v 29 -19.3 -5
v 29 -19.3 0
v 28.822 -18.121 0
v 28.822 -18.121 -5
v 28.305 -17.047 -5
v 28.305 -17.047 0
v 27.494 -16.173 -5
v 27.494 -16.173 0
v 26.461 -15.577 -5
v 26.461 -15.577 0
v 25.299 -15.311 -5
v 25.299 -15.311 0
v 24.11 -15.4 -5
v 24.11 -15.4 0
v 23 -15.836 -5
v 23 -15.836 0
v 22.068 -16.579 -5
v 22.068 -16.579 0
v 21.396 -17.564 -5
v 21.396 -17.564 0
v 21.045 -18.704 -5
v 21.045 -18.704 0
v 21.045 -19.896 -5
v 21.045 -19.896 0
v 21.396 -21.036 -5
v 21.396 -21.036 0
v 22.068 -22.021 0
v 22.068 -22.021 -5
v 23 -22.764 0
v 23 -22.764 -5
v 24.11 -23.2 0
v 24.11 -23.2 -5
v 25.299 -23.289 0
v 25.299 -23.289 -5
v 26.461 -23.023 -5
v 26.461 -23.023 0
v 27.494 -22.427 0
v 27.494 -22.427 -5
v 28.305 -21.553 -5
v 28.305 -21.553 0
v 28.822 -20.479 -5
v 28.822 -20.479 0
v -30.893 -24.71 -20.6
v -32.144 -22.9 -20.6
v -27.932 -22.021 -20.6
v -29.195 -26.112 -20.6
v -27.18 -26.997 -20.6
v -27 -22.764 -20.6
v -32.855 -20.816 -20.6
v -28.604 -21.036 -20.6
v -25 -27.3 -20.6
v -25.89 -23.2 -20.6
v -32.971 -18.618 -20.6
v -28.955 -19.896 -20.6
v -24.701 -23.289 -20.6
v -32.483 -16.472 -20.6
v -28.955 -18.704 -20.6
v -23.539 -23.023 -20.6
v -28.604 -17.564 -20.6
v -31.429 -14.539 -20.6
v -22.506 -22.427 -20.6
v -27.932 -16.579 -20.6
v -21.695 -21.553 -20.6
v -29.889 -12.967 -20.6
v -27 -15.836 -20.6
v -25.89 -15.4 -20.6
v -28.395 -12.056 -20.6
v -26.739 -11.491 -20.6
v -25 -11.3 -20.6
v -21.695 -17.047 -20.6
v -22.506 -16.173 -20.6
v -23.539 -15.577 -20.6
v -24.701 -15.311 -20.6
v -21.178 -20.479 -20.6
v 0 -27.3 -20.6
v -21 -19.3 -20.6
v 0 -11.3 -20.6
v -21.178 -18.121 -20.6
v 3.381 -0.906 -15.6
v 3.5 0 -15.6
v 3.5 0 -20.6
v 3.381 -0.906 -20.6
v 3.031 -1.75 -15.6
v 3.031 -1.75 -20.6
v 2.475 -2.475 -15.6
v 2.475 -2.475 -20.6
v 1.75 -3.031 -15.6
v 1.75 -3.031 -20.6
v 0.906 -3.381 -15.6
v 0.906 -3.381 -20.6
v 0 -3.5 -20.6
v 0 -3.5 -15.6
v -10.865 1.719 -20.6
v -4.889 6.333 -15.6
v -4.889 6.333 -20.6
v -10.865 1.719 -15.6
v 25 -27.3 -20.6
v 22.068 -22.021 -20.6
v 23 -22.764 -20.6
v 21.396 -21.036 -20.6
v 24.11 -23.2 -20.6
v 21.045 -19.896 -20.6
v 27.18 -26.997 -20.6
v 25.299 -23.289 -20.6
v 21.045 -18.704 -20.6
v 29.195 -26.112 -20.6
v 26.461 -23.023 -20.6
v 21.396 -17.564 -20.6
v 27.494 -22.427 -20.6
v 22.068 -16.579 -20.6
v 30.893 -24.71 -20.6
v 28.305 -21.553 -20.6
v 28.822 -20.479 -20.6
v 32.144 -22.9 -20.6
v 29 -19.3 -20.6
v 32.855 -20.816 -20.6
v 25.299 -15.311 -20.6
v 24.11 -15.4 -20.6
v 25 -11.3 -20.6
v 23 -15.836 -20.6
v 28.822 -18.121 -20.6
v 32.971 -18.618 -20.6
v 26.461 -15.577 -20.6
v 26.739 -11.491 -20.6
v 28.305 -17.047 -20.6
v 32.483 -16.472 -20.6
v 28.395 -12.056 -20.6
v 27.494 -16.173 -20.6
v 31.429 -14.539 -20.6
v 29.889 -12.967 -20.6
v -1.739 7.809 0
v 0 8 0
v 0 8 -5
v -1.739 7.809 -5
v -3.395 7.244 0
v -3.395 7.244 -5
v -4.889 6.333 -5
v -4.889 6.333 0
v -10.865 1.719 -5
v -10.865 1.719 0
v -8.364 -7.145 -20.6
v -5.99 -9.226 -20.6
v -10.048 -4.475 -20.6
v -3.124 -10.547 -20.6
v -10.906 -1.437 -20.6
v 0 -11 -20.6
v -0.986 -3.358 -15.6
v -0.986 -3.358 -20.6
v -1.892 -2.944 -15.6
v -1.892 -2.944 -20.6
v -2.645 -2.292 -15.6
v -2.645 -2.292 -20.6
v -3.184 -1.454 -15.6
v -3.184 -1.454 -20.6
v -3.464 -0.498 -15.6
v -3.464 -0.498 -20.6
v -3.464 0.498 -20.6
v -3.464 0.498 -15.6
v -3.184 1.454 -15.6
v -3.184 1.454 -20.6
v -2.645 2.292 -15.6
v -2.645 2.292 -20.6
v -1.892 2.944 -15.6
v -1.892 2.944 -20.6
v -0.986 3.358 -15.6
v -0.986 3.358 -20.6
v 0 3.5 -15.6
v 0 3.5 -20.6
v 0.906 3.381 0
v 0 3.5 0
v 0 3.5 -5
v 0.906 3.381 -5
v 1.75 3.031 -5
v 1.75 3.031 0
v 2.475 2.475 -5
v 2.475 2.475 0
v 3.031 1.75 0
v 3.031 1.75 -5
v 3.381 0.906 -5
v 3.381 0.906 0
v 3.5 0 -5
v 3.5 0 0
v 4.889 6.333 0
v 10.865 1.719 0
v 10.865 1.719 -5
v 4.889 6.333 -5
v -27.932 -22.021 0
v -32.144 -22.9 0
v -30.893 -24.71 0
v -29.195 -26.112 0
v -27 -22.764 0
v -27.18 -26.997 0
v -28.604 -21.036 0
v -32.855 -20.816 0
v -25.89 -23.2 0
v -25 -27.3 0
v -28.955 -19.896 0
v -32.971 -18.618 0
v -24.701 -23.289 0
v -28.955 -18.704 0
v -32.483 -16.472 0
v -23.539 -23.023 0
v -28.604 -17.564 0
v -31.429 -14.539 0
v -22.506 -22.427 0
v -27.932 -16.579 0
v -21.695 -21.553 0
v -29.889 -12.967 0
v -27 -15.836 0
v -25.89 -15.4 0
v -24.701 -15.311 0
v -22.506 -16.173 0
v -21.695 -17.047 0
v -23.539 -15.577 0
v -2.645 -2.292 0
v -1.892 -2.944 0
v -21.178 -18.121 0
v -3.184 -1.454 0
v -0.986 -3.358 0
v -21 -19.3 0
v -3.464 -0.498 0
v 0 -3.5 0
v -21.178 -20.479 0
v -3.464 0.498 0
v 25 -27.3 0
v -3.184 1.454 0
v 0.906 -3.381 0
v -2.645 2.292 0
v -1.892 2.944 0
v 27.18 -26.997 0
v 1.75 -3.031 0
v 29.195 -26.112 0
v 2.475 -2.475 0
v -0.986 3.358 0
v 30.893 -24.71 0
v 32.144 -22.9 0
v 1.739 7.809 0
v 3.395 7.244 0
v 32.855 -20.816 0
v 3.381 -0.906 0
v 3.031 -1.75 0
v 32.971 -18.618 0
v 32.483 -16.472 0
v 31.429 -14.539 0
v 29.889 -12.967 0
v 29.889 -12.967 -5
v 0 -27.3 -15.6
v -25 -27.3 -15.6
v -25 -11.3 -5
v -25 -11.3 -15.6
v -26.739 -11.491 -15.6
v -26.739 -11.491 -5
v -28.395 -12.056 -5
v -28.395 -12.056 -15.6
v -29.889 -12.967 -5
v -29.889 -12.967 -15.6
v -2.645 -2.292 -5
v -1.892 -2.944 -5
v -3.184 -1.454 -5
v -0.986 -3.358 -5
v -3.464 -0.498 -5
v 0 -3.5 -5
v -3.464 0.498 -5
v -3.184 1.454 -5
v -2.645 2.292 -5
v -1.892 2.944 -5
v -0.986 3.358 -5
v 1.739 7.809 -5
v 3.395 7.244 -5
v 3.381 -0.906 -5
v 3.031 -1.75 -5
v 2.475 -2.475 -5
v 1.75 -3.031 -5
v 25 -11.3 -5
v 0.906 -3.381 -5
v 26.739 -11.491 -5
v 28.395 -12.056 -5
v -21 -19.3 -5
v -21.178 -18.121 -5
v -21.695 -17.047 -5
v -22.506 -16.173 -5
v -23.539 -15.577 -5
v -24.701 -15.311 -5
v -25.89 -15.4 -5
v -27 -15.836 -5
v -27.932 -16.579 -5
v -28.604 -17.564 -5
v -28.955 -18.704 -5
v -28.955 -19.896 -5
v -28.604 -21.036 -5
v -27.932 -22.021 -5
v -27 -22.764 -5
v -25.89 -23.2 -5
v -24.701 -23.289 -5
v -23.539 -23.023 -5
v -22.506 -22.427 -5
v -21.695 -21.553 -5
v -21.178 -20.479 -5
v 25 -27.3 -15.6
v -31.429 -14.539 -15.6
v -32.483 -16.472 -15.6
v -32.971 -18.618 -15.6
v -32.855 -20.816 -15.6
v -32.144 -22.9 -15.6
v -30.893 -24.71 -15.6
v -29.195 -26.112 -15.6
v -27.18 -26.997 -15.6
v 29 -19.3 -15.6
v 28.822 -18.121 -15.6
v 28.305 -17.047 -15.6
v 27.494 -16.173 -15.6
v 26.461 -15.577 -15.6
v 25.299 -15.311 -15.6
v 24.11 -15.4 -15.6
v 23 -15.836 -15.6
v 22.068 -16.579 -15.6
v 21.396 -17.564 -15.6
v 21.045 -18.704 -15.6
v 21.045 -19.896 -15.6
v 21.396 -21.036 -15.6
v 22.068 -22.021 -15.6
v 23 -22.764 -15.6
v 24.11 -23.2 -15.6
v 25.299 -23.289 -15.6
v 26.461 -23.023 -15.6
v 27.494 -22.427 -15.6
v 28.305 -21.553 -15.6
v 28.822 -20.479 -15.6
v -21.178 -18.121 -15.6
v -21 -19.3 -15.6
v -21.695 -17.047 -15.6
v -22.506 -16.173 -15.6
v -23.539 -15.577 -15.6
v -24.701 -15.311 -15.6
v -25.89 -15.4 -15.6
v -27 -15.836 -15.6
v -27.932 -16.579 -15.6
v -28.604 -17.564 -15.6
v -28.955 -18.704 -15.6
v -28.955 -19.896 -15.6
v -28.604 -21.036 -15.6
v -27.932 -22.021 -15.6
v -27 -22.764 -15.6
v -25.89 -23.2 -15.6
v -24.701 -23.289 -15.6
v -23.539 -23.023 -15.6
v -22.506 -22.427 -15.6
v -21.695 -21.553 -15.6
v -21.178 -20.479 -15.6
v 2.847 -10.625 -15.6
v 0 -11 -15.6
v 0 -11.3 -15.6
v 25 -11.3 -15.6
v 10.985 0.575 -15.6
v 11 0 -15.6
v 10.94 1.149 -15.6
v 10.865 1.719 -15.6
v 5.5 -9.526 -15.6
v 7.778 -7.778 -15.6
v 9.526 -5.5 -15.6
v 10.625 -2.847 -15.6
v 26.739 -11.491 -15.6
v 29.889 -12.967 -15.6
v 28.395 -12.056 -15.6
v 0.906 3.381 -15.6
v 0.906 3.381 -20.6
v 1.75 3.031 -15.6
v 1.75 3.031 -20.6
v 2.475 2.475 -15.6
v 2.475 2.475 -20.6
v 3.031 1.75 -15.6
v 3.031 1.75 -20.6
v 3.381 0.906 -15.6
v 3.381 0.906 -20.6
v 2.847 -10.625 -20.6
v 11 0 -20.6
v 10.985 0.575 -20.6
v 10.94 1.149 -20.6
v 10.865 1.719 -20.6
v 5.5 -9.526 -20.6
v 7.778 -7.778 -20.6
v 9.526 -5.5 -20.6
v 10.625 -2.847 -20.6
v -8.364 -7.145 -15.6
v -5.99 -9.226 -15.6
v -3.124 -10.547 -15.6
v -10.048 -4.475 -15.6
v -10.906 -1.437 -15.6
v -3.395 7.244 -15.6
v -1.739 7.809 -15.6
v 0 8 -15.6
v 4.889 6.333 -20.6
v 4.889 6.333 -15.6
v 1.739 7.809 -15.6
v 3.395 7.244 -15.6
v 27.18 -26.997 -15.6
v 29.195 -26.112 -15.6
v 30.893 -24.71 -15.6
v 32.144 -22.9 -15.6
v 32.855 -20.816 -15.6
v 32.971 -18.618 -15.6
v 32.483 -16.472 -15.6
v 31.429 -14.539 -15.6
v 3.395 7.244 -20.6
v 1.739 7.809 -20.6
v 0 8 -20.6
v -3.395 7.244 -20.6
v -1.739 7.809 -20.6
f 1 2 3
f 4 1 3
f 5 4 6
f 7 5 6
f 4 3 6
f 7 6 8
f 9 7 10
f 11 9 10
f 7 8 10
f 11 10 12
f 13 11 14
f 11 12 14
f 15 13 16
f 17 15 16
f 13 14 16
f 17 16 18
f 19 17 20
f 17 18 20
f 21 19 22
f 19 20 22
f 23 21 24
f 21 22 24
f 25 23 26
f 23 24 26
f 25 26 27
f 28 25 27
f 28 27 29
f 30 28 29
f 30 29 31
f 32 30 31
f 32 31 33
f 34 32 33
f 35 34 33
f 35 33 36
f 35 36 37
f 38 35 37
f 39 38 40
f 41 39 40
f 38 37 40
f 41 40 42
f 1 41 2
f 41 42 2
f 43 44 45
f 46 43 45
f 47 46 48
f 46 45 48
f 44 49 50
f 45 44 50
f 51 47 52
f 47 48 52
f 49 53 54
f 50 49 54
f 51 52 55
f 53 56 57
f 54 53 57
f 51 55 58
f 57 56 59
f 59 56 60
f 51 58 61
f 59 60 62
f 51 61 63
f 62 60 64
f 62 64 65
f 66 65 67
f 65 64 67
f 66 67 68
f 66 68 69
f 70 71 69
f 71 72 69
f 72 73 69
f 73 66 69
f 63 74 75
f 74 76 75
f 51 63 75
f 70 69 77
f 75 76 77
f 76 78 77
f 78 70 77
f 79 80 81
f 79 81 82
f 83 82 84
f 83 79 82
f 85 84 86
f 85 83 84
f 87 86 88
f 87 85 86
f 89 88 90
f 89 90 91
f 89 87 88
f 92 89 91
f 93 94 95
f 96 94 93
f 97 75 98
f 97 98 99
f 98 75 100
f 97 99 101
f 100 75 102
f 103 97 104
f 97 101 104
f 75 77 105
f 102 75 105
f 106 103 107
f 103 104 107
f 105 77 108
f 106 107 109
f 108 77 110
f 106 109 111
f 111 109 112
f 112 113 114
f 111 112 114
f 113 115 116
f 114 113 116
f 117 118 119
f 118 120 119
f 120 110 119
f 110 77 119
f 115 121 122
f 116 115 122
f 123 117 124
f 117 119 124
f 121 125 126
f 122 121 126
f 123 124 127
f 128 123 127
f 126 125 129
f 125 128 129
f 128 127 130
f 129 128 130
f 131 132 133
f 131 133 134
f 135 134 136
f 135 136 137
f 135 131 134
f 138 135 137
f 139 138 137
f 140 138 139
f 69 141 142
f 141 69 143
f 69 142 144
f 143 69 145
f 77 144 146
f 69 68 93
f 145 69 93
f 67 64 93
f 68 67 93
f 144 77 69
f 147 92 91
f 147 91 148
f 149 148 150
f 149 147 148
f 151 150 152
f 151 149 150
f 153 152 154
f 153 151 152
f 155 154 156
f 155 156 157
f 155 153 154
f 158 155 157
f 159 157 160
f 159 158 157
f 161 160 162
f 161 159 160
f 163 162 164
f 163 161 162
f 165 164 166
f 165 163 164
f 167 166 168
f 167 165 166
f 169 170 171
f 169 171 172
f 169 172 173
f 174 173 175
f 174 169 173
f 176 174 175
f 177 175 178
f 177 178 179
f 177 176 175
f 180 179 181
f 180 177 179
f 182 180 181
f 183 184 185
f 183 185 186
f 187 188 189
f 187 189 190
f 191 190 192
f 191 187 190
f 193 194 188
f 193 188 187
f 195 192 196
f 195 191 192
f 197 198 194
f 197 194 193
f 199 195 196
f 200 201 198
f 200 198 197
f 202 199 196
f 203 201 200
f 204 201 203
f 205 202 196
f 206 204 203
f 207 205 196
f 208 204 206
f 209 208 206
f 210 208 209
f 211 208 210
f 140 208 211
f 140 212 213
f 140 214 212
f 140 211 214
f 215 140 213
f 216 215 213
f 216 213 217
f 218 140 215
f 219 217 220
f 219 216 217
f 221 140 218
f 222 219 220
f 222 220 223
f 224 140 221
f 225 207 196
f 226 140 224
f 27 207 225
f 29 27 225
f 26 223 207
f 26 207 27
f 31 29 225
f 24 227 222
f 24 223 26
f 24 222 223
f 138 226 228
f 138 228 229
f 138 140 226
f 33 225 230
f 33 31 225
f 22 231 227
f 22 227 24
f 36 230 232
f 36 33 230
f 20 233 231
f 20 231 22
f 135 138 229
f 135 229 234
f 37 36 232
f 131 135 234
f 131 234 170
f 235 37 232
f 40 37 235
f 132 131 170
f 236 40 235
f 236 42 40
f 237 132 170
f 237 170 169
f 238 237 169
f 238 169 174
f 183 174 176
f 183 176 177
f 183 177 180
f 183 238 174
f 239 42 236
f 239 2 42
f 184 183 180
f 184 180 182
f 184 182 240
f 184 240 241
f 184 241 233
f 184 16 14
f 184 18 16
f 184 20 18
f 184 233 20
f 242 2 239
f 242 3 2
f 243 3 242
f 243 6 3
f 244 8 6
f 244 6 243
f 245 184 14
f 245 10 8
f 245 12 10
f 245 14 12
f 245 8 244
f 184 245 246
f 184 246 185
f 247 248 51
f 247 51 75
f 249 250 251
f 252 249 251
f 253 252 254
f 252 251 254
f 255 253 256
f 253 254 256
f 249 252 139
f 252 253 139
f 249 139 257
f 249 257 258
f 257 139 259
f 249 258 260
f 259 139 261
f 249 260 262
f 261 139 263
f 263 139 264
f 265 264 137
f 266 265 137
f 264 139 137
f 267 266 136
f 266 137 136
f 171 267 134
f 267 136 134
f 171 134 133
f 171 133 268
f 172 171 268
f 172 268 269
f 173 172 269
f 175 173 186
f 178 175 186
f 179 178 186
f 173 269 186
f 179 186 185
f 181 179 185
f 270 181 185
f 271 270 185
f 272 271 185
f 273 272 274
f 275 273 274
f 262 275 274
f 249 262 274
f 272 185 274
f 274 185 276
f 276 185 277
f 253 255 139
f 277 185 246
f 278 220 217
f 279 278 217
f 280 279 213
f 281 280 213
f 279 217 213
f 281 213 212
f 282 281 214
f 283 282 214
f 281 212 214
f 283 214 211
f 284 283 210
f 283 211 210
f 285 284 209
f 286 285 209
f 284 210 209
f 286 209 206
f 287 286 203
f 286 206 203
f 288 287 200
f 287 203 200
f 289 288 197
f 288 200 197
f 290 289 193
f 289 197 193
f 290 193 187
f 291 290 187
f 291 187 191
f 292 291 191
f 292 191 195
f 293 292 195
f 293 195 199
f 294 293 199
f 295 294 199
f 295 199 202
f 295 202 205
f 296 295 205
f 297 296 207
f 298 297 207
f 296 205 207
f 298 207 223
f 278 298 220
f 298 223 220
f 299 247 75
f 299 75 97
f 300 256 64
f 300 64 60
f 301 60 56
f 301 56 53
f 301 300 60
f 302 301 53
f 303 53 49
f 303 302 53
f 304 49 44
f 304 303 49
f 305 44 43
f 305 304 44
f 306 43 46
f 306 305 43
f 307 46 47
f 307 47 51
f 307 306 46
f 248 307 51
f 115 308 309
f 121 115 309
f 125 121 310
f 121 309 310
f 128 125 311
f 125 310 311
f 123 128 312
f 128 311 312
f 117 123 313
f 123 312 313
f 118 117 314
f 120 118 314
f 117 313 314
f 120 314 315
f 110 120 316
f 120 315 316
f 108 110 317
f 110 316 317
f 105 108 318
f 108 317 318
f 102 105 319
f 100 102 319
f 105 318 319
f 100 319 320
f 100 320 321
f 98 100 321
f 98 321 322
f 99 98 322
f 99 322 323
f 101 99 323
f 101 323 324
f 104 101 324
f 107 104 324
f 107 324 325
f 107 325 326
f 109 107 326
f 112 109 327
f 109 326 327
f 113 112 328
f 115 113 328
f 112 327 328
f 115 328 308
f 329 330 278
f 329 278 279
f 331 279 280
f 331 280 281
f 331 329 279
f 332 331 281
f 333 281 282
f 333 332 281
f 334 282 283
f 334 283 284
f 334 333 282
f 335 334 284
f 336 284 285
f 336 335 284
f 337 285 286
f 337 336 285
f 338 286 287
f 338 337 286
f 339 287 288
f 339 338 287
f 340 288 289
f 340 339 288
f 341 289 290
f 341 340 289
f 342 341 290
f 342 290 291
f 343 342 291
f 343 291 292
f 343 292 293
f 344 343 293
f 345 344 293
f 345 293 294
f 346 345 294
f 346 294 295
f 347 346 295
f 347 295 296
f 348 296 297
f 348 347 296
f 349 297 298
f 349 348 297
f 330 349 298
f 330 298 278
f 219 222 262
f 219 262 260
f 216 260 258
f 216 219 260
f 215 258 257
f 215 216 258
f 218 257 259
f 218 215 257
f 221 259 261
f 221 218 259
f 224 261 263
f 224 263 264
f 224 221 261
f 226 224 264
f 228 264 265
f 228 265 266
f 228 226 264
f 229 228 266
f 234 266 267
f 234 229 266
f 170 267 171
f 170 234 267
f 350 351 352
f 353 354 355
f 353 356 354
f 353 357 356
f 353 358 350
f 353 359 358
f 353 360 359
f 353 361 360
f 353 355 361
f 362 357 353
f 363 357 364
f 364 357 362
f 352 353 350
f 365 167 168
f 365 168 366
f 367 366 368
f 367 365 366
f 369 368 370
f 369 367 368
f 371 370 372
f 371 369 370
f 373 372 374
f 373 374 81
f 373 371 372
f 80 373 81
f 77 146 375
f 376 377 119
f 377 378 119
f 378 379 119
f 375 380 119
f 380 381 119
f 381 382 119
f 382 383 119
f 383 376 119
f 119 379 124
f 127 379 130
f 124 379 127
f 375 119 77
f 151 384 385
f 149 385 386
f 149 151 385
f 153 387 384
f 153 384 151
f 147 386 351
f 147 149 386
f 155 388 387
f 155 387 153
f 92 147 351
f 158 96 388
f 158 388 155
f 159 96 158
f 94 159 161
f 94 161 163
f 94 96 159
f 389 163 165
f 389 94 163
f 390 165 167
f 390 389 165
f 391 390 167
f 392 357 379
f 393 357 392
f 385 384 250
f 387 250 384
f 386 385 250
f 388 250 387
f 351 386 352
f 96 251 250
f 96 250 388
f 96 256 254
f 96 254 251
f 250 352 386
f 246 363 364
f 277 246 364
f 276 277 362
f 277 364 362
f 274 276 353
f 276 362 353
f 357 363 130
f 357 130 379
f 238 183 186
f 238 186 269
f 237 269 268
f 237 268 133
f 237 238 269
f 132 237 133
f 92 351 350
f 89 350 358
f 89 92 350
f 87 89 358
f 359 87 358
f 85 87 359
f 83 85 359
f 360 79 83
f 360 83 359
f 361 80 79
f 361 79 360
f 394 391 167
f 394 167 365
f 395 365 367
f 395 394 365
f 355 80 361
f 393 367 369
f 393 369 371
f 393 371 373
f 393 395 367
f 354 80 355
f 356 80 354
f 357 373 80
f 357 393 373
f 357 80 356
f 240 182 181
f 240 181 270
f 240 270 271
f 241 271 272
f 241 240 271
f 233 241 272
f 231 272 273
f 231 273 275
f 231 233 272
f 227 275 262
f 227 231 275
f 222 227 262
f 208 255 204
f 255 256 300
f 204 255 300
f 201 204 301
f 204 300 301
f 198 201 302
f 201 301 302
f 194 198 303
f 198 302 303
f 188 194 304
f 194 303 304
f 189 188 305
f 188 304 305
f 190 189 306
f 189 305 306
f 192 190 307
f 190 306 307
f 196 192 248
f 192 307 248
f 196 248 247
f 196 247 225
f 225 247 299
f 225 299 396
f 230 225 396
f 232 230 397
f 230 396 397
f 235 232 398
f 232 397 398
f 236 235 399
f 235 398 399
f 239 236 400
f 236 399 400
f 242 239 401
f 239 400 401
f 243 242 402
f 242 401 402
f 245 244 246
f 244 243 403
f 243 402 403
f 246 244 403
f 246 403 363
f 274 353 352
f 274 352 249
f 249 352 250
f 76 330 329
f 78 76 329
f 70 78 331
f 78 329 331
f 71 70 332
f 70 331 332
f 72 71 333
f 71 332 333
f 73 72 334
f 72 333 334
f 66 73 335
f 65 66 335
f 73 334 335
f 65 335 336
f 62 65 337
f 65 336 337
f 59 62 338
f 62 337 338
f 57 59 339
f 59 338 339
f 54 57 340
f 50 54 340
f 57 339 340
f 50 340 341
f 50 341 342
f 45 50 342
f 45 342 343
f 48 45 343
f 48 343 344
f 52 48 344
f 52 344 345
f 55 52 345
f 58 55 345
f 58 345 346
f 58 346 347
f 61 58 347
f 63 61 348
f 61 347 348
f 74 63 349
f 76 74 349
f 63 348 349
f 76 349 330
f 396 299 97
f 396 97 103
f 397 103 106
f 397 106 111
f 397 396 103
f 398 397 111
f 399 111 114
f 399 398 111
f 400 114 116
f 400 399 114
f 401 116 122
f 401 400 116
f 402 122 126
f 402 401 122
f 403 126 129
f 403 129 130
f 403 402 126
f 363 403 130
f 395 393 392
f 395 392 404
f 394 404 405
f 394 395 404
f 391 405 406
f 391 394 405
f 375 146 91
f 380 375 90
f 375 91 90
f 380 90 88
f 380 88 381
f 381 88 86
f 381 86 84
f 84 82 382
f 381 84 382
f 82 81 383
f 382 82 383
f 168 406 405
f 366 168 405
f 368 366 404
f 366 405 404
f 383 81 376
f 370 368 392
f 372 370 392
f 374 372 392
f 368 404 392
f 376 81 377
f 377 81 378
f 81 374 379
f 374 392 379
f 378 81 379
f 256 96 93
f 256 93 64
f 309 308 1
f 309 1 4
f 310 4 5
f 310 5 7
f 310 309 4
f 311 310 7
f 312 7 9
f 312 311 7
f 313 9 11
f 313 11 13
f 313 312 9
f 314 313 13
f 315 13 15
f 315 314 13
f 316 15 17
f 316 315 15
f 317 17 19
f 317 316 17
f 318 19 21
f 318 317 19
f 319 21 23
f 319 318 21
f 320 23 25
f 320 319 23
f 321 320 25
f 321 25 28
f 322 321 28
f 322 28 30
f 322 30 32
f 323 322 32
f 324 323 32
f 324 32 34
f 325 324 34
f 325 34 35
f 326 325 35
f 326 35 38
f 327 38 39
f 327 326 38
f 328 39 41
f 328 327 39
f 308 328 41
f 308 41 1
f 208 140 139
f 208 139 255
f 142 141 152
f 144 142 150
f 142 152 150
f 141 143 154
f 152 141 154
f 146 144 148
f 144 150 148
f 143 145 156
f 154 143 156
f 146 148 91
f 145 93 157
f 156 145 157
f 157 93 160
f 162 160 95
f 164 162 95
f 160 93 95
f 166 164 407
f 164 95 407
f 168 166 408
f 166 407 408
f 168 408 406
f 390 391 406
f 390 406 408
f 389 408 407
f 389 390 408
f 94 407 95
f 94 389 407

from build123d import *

# Parameters (mm, degrees)
SKETCH1_R           = 4
BOSS_EXTRUDE1_DEPTH = 5
BOSS_EXTRUDE2_START = -15.6
SKETCH1_3_R         = 4
BOSS_EXTRUDE2_DEPTH = 10.6
BOSS_EXTRUDE3_START = -15.6
SKETCH1_4_R         = 4
BOSS_EXTRUDE3_DEPTH = 5


with BuildPart() as part:
    # Sketch1 → Boss-Extrude1 (new body)
    # profile 1 of 6: a face of its own
    with BuildSketch(Plane.XY):
        with BuildLine():
            ThreePointArc((-25, -11.3), (-27.58262842, -11.728340311), (-29.888695875, -12.967492389))
            ThreePointArc((-29.888695875, -12.967492389), (-32.571659689, -21.88262842), (-25, -27.3))
            Line((-25, -27.3), (0, -27.3))
            Line((0, -27.3), (0, -11.3))
            Line((0, -11.3), (-25, -11.3))
        make_face()
        with Locations((-25, -19.3)):
            Circle(SKETCH1_R, mode=Mode.SUBTRACT)
    # profile 2 of 6: a face of its own
    with BuildSketch(Plane.XY):
        with BuildLine():
            ThreePointArc((25, -27.3), (32.571659689, -21.88262842), (29.888695875, -12.967492389))
            ThreePointArc((29.888695875, -12.967492389), (27.58262842, -11.728340311), (25, -11.3))
            Line((25, -11.3), (0, -11.3))
            Line((0, -11.3), (0, -27.3))
            Line((0, -27.3), (25, -27.3))
        make_face()
        with Locations((25, -19.3)):
            Circle(SKETCH1_R, mode=Mode.SUBTRACT)
    # profile 3 of 6: a face of its own
    with BuildSketch(Plane.XY):
        with BuildLine():
            Line((29.888695875, -12.967492389), (10.864868878, 1.718902053))
            ThreePointArc((10.864868878, 1.718902053), (10.966165183, 0.862102762), (11, 0))
            ThreePointArc((11, 0), (7.778174593, -7.778174593), (0, -11))
            Line((0, -11), (0, -11.3))
            Line((0, -11.3), (25, -11.3))
            ThreePointArc((25, -11.3), (27.58262842, -11.728340311), (29.888695875, -12.967492389))
        make_face()
    # profile 4 of 6: a face of its own
    with BuildSketch(Plane.XY):
        with BuildLine():
            ThreePointArc((4.888695875, 6.332507611), (2.58262842, 7.571659689), (0, 8))
            Line((0, 8), (0, 3.5))
            ThreePointArc((0, 3.5), (2.474873734, 2.474873734), (3.5, 0))
            ThreePointArc((3.5, 0), (2.474873734, -2.474873734), (0, -3.5))
            Line((0, -3.5), (0, -11))
            ThreePointArc((0, -11), (7.778174593, -7.778174593), (11, 0))
            ThreePointArc((11, 0), (10.966165183, 0.862102762), (10.864868878, 1.718902053))
            Line((10.864868878, 1.718902053), (4.888695875, 6.332507611))
        make_face()
    # profile 5 of 6: a face of its own
    with BuildSketch(Plane.XY):
        with BuildLine():
            Line((0, 3.5), (0, 8))
            ThreePointArc((0, 8), (-2.58262842, 7.571659689), (-4.888695875, 6.332507611))
            Line((-4.888695875, 6.332507611), (-10.864868878, 1.718902053))
            ThreePointArc((-10.864868878, 1.718902053), (-8.363848474, -7.144651056), (0, -11))
            Line((0, -11), (0, -3.5))
            ThreePointArc((0, -3.5), (-3.5, 0), (0, 3.5))
        make_face()
    # profile 6 of 6: a face of its own
    with BuildSketch(Plane.XY):
        with BuildLine():
            ThreePointArc((0, -11), (-8.363848474, -7.144651056), (-10.864868878, 1.718902053))
            Line((-10.864868878, 1.718902053), (-29.888695875, -12.967492389))
            ThreePointArc((-29.888695875, -12.967492389), (-27.58262842, -11.728340311), (-25, -11.3))
            Line((-25, -11.3), (0, -11.3))
            Line((0, -11.3), (0, -11))
        make_face()
    extrude(amount=-BOSS_EXTRUDE1_DEPTH)

    # Sketch1<3> → Boss-Extrude2 (add)
    with BuildSketch(Plane.XY.offset(BOSS_EXTRUDE2_START)):
        with BuildLine():
            Line((-25, -27.3), (25, -27.3))
            ThreePointArc((25, -27.3), (32.571659689, -21.88262842), (29.888695875, -12.967492389))
            ThreePointArc((29.888695875, -12.967492389), (27.58262842, -11.728340311), (25, -11.3))
            Line((25, -11.3), (-25, -11.3))
            ThreePointArc((-25, -11.3), (-27.58262842, -11.728340311), (-29.888695875, -12.967492389))
            ThreePointArc((-29.888695875, -12.967492389), (-32.571659689, -21.88262842), (-25, -27.3))
        make_face()
        with Locations((-25, -19.3)):
            Circle(SKETCH1_3_R, mode=Mode.SUBTRACT)
        with Locations((25, -19.3)):
            Circle(SKETCH1_3_R, mode=Mode.SUBTRACT)
    extrude(amount=BOSS_EXTRUDE2_DEPTH)

    # Sketch1<4> → Boss-Extrude3 (add)
    # profile 1 of 6: a face of its own
    with BuildSketch(Plane.XY.offset(BOSS_EXTRUDE3_START)):
        with BuildLine():
            ThreePointArc((0, -11), (-8.363848474, -7.144651056), (-10.864868878, 1.718902053))
            Line((-10.864868878, 1.718902053), (-29.888695875, -12.967492389))
            ThreePointArc((-29.888695875, -12.967492389), (-27.58262842, -11.728340311), (-25, -11.3))
            Line((-25, -11.3), (0, -11.3))
            Line((0, -11.3), (0, -11))
        make_face()
    # profile 2 of 6: a face of its own
    with BuildSketch(Plane.XY.offset(BOSS_EXTRUDE3_START)):
        with BuildLine():
            Line((0, 3.5), (0, 8))
            ThreePointArc((0, 8), (-2.58262842, 7.571659689), (-4.888695875, 6.332507611))
            Line((-4.888695875, 6.332507611), (-10.864868878, 1.718902053))
            ThreePointArc((-10.864868878, 1.718902053), (-8.363848474, -7.144651056), (0, -11))
            Line((0, -11), (0, -3.5))
            ThreePointArc((0, -3.5), (-3.5, 0), (0, 3.5))
        make_face()
    # profile 3 of 6: a face of its own
    with BuildSketch(Plane.XY.offset(BOSS_EXTRUDE3_START)):
        with BuildLine():
            ThreePointArc((4.888695875, 6.332507611), (2.58262842, 7.571659689), (0, 8))
            Line((0, 8), (0, 3.5))
            ThreePointArc((0, 3.5), (2.474873734, 2.474873734), (3.5, 0))
            ThreePointArc((3.5, 0), (2.474873734, -2.474873734), (0, -3.5))
            Line((0, -3.5), (0, -11))
            ThreePointArc((0, -11), (7.778174593, -7.778174593), (11, 0))
            ThreePointArc((11, 0), (10.966165183, 0.862102762), (10.864868878, 1.718902053))
            Line((10.864868878, 1.718902053), (4.888695875, 6.332507611))
        make_face()
    # profile 4 of 6: a face of its own
    with BuildSketch(Plane.XY.offset(BOSS_EXTRUDE3_START)):
        with BuildLine():
            Line((29.888695875, -12.967492389), (10.864868878, 1.718902053))
            ThreePointArc((10.864868878, 1.718902053), (10.966165183, 0.862102762), (11, 0))
            ThreePointArc((11, 0), (7.778174593, -7.778174593), (0, -11))
            Line((0, -11), (0, -11.3))
            Line((0, -11.3), (25, -11.3))
            ThreePointArc((25, -11.3), (27.58262842, -11.728340311), (29.888695875, -12.967492389))
        make_face()
    # profile 5 of 6: a face of its own
    with BuildSketch(Plane.XY.offset(BOSS_EXTRUDE3_START)):
        with BuildLine():
            ThreePointArc((25, -27.3), (32.571659689, -21.88262842), (29.888695875, -12.967492389))
            ThreePointArc((29.888695875, -12.967492389), (27.58262842, -11.728340311), (25, -11.3))
            Line((25, -11.3), (0, -11.3))
            Line((0, -11.3), (0, -27.3))
            Line((0, -27.3), (25, -27.3))
        make_face()
        with Locations((25, -19.3)):
            Circle(SKETCH1_4_R, mode=Mode.SUBTRACT)
    # profile 6 of 6: a face of its own
    with BuildSketch(Plane.XY.offset(BOSS_EXTRUDE3_START)):
        with BuildLine():
            ThreePointArc((-25, -11.3), (-27.58262842, -11.728340311), (-29.888695875, -12.967492389))
            ThreePointArc((-29.888695875, -12.967492389), (-32.571659689, -21.88262842), (-25, -27.3))
            Line((-25, -27.3), (0, -27.3))
            Line((0, -27.3), (0, -11.3))
            Line((0, -11.3), (-25, -11.3))
        make_face()
        with Locations((-25, -19.3)):
            Circle(SKETCH1_4_R, mode=Mode.SUBTRACT)
    extrude(amount=-BOSS_EXTRUDE3_DEPTH)


solid = part.part
